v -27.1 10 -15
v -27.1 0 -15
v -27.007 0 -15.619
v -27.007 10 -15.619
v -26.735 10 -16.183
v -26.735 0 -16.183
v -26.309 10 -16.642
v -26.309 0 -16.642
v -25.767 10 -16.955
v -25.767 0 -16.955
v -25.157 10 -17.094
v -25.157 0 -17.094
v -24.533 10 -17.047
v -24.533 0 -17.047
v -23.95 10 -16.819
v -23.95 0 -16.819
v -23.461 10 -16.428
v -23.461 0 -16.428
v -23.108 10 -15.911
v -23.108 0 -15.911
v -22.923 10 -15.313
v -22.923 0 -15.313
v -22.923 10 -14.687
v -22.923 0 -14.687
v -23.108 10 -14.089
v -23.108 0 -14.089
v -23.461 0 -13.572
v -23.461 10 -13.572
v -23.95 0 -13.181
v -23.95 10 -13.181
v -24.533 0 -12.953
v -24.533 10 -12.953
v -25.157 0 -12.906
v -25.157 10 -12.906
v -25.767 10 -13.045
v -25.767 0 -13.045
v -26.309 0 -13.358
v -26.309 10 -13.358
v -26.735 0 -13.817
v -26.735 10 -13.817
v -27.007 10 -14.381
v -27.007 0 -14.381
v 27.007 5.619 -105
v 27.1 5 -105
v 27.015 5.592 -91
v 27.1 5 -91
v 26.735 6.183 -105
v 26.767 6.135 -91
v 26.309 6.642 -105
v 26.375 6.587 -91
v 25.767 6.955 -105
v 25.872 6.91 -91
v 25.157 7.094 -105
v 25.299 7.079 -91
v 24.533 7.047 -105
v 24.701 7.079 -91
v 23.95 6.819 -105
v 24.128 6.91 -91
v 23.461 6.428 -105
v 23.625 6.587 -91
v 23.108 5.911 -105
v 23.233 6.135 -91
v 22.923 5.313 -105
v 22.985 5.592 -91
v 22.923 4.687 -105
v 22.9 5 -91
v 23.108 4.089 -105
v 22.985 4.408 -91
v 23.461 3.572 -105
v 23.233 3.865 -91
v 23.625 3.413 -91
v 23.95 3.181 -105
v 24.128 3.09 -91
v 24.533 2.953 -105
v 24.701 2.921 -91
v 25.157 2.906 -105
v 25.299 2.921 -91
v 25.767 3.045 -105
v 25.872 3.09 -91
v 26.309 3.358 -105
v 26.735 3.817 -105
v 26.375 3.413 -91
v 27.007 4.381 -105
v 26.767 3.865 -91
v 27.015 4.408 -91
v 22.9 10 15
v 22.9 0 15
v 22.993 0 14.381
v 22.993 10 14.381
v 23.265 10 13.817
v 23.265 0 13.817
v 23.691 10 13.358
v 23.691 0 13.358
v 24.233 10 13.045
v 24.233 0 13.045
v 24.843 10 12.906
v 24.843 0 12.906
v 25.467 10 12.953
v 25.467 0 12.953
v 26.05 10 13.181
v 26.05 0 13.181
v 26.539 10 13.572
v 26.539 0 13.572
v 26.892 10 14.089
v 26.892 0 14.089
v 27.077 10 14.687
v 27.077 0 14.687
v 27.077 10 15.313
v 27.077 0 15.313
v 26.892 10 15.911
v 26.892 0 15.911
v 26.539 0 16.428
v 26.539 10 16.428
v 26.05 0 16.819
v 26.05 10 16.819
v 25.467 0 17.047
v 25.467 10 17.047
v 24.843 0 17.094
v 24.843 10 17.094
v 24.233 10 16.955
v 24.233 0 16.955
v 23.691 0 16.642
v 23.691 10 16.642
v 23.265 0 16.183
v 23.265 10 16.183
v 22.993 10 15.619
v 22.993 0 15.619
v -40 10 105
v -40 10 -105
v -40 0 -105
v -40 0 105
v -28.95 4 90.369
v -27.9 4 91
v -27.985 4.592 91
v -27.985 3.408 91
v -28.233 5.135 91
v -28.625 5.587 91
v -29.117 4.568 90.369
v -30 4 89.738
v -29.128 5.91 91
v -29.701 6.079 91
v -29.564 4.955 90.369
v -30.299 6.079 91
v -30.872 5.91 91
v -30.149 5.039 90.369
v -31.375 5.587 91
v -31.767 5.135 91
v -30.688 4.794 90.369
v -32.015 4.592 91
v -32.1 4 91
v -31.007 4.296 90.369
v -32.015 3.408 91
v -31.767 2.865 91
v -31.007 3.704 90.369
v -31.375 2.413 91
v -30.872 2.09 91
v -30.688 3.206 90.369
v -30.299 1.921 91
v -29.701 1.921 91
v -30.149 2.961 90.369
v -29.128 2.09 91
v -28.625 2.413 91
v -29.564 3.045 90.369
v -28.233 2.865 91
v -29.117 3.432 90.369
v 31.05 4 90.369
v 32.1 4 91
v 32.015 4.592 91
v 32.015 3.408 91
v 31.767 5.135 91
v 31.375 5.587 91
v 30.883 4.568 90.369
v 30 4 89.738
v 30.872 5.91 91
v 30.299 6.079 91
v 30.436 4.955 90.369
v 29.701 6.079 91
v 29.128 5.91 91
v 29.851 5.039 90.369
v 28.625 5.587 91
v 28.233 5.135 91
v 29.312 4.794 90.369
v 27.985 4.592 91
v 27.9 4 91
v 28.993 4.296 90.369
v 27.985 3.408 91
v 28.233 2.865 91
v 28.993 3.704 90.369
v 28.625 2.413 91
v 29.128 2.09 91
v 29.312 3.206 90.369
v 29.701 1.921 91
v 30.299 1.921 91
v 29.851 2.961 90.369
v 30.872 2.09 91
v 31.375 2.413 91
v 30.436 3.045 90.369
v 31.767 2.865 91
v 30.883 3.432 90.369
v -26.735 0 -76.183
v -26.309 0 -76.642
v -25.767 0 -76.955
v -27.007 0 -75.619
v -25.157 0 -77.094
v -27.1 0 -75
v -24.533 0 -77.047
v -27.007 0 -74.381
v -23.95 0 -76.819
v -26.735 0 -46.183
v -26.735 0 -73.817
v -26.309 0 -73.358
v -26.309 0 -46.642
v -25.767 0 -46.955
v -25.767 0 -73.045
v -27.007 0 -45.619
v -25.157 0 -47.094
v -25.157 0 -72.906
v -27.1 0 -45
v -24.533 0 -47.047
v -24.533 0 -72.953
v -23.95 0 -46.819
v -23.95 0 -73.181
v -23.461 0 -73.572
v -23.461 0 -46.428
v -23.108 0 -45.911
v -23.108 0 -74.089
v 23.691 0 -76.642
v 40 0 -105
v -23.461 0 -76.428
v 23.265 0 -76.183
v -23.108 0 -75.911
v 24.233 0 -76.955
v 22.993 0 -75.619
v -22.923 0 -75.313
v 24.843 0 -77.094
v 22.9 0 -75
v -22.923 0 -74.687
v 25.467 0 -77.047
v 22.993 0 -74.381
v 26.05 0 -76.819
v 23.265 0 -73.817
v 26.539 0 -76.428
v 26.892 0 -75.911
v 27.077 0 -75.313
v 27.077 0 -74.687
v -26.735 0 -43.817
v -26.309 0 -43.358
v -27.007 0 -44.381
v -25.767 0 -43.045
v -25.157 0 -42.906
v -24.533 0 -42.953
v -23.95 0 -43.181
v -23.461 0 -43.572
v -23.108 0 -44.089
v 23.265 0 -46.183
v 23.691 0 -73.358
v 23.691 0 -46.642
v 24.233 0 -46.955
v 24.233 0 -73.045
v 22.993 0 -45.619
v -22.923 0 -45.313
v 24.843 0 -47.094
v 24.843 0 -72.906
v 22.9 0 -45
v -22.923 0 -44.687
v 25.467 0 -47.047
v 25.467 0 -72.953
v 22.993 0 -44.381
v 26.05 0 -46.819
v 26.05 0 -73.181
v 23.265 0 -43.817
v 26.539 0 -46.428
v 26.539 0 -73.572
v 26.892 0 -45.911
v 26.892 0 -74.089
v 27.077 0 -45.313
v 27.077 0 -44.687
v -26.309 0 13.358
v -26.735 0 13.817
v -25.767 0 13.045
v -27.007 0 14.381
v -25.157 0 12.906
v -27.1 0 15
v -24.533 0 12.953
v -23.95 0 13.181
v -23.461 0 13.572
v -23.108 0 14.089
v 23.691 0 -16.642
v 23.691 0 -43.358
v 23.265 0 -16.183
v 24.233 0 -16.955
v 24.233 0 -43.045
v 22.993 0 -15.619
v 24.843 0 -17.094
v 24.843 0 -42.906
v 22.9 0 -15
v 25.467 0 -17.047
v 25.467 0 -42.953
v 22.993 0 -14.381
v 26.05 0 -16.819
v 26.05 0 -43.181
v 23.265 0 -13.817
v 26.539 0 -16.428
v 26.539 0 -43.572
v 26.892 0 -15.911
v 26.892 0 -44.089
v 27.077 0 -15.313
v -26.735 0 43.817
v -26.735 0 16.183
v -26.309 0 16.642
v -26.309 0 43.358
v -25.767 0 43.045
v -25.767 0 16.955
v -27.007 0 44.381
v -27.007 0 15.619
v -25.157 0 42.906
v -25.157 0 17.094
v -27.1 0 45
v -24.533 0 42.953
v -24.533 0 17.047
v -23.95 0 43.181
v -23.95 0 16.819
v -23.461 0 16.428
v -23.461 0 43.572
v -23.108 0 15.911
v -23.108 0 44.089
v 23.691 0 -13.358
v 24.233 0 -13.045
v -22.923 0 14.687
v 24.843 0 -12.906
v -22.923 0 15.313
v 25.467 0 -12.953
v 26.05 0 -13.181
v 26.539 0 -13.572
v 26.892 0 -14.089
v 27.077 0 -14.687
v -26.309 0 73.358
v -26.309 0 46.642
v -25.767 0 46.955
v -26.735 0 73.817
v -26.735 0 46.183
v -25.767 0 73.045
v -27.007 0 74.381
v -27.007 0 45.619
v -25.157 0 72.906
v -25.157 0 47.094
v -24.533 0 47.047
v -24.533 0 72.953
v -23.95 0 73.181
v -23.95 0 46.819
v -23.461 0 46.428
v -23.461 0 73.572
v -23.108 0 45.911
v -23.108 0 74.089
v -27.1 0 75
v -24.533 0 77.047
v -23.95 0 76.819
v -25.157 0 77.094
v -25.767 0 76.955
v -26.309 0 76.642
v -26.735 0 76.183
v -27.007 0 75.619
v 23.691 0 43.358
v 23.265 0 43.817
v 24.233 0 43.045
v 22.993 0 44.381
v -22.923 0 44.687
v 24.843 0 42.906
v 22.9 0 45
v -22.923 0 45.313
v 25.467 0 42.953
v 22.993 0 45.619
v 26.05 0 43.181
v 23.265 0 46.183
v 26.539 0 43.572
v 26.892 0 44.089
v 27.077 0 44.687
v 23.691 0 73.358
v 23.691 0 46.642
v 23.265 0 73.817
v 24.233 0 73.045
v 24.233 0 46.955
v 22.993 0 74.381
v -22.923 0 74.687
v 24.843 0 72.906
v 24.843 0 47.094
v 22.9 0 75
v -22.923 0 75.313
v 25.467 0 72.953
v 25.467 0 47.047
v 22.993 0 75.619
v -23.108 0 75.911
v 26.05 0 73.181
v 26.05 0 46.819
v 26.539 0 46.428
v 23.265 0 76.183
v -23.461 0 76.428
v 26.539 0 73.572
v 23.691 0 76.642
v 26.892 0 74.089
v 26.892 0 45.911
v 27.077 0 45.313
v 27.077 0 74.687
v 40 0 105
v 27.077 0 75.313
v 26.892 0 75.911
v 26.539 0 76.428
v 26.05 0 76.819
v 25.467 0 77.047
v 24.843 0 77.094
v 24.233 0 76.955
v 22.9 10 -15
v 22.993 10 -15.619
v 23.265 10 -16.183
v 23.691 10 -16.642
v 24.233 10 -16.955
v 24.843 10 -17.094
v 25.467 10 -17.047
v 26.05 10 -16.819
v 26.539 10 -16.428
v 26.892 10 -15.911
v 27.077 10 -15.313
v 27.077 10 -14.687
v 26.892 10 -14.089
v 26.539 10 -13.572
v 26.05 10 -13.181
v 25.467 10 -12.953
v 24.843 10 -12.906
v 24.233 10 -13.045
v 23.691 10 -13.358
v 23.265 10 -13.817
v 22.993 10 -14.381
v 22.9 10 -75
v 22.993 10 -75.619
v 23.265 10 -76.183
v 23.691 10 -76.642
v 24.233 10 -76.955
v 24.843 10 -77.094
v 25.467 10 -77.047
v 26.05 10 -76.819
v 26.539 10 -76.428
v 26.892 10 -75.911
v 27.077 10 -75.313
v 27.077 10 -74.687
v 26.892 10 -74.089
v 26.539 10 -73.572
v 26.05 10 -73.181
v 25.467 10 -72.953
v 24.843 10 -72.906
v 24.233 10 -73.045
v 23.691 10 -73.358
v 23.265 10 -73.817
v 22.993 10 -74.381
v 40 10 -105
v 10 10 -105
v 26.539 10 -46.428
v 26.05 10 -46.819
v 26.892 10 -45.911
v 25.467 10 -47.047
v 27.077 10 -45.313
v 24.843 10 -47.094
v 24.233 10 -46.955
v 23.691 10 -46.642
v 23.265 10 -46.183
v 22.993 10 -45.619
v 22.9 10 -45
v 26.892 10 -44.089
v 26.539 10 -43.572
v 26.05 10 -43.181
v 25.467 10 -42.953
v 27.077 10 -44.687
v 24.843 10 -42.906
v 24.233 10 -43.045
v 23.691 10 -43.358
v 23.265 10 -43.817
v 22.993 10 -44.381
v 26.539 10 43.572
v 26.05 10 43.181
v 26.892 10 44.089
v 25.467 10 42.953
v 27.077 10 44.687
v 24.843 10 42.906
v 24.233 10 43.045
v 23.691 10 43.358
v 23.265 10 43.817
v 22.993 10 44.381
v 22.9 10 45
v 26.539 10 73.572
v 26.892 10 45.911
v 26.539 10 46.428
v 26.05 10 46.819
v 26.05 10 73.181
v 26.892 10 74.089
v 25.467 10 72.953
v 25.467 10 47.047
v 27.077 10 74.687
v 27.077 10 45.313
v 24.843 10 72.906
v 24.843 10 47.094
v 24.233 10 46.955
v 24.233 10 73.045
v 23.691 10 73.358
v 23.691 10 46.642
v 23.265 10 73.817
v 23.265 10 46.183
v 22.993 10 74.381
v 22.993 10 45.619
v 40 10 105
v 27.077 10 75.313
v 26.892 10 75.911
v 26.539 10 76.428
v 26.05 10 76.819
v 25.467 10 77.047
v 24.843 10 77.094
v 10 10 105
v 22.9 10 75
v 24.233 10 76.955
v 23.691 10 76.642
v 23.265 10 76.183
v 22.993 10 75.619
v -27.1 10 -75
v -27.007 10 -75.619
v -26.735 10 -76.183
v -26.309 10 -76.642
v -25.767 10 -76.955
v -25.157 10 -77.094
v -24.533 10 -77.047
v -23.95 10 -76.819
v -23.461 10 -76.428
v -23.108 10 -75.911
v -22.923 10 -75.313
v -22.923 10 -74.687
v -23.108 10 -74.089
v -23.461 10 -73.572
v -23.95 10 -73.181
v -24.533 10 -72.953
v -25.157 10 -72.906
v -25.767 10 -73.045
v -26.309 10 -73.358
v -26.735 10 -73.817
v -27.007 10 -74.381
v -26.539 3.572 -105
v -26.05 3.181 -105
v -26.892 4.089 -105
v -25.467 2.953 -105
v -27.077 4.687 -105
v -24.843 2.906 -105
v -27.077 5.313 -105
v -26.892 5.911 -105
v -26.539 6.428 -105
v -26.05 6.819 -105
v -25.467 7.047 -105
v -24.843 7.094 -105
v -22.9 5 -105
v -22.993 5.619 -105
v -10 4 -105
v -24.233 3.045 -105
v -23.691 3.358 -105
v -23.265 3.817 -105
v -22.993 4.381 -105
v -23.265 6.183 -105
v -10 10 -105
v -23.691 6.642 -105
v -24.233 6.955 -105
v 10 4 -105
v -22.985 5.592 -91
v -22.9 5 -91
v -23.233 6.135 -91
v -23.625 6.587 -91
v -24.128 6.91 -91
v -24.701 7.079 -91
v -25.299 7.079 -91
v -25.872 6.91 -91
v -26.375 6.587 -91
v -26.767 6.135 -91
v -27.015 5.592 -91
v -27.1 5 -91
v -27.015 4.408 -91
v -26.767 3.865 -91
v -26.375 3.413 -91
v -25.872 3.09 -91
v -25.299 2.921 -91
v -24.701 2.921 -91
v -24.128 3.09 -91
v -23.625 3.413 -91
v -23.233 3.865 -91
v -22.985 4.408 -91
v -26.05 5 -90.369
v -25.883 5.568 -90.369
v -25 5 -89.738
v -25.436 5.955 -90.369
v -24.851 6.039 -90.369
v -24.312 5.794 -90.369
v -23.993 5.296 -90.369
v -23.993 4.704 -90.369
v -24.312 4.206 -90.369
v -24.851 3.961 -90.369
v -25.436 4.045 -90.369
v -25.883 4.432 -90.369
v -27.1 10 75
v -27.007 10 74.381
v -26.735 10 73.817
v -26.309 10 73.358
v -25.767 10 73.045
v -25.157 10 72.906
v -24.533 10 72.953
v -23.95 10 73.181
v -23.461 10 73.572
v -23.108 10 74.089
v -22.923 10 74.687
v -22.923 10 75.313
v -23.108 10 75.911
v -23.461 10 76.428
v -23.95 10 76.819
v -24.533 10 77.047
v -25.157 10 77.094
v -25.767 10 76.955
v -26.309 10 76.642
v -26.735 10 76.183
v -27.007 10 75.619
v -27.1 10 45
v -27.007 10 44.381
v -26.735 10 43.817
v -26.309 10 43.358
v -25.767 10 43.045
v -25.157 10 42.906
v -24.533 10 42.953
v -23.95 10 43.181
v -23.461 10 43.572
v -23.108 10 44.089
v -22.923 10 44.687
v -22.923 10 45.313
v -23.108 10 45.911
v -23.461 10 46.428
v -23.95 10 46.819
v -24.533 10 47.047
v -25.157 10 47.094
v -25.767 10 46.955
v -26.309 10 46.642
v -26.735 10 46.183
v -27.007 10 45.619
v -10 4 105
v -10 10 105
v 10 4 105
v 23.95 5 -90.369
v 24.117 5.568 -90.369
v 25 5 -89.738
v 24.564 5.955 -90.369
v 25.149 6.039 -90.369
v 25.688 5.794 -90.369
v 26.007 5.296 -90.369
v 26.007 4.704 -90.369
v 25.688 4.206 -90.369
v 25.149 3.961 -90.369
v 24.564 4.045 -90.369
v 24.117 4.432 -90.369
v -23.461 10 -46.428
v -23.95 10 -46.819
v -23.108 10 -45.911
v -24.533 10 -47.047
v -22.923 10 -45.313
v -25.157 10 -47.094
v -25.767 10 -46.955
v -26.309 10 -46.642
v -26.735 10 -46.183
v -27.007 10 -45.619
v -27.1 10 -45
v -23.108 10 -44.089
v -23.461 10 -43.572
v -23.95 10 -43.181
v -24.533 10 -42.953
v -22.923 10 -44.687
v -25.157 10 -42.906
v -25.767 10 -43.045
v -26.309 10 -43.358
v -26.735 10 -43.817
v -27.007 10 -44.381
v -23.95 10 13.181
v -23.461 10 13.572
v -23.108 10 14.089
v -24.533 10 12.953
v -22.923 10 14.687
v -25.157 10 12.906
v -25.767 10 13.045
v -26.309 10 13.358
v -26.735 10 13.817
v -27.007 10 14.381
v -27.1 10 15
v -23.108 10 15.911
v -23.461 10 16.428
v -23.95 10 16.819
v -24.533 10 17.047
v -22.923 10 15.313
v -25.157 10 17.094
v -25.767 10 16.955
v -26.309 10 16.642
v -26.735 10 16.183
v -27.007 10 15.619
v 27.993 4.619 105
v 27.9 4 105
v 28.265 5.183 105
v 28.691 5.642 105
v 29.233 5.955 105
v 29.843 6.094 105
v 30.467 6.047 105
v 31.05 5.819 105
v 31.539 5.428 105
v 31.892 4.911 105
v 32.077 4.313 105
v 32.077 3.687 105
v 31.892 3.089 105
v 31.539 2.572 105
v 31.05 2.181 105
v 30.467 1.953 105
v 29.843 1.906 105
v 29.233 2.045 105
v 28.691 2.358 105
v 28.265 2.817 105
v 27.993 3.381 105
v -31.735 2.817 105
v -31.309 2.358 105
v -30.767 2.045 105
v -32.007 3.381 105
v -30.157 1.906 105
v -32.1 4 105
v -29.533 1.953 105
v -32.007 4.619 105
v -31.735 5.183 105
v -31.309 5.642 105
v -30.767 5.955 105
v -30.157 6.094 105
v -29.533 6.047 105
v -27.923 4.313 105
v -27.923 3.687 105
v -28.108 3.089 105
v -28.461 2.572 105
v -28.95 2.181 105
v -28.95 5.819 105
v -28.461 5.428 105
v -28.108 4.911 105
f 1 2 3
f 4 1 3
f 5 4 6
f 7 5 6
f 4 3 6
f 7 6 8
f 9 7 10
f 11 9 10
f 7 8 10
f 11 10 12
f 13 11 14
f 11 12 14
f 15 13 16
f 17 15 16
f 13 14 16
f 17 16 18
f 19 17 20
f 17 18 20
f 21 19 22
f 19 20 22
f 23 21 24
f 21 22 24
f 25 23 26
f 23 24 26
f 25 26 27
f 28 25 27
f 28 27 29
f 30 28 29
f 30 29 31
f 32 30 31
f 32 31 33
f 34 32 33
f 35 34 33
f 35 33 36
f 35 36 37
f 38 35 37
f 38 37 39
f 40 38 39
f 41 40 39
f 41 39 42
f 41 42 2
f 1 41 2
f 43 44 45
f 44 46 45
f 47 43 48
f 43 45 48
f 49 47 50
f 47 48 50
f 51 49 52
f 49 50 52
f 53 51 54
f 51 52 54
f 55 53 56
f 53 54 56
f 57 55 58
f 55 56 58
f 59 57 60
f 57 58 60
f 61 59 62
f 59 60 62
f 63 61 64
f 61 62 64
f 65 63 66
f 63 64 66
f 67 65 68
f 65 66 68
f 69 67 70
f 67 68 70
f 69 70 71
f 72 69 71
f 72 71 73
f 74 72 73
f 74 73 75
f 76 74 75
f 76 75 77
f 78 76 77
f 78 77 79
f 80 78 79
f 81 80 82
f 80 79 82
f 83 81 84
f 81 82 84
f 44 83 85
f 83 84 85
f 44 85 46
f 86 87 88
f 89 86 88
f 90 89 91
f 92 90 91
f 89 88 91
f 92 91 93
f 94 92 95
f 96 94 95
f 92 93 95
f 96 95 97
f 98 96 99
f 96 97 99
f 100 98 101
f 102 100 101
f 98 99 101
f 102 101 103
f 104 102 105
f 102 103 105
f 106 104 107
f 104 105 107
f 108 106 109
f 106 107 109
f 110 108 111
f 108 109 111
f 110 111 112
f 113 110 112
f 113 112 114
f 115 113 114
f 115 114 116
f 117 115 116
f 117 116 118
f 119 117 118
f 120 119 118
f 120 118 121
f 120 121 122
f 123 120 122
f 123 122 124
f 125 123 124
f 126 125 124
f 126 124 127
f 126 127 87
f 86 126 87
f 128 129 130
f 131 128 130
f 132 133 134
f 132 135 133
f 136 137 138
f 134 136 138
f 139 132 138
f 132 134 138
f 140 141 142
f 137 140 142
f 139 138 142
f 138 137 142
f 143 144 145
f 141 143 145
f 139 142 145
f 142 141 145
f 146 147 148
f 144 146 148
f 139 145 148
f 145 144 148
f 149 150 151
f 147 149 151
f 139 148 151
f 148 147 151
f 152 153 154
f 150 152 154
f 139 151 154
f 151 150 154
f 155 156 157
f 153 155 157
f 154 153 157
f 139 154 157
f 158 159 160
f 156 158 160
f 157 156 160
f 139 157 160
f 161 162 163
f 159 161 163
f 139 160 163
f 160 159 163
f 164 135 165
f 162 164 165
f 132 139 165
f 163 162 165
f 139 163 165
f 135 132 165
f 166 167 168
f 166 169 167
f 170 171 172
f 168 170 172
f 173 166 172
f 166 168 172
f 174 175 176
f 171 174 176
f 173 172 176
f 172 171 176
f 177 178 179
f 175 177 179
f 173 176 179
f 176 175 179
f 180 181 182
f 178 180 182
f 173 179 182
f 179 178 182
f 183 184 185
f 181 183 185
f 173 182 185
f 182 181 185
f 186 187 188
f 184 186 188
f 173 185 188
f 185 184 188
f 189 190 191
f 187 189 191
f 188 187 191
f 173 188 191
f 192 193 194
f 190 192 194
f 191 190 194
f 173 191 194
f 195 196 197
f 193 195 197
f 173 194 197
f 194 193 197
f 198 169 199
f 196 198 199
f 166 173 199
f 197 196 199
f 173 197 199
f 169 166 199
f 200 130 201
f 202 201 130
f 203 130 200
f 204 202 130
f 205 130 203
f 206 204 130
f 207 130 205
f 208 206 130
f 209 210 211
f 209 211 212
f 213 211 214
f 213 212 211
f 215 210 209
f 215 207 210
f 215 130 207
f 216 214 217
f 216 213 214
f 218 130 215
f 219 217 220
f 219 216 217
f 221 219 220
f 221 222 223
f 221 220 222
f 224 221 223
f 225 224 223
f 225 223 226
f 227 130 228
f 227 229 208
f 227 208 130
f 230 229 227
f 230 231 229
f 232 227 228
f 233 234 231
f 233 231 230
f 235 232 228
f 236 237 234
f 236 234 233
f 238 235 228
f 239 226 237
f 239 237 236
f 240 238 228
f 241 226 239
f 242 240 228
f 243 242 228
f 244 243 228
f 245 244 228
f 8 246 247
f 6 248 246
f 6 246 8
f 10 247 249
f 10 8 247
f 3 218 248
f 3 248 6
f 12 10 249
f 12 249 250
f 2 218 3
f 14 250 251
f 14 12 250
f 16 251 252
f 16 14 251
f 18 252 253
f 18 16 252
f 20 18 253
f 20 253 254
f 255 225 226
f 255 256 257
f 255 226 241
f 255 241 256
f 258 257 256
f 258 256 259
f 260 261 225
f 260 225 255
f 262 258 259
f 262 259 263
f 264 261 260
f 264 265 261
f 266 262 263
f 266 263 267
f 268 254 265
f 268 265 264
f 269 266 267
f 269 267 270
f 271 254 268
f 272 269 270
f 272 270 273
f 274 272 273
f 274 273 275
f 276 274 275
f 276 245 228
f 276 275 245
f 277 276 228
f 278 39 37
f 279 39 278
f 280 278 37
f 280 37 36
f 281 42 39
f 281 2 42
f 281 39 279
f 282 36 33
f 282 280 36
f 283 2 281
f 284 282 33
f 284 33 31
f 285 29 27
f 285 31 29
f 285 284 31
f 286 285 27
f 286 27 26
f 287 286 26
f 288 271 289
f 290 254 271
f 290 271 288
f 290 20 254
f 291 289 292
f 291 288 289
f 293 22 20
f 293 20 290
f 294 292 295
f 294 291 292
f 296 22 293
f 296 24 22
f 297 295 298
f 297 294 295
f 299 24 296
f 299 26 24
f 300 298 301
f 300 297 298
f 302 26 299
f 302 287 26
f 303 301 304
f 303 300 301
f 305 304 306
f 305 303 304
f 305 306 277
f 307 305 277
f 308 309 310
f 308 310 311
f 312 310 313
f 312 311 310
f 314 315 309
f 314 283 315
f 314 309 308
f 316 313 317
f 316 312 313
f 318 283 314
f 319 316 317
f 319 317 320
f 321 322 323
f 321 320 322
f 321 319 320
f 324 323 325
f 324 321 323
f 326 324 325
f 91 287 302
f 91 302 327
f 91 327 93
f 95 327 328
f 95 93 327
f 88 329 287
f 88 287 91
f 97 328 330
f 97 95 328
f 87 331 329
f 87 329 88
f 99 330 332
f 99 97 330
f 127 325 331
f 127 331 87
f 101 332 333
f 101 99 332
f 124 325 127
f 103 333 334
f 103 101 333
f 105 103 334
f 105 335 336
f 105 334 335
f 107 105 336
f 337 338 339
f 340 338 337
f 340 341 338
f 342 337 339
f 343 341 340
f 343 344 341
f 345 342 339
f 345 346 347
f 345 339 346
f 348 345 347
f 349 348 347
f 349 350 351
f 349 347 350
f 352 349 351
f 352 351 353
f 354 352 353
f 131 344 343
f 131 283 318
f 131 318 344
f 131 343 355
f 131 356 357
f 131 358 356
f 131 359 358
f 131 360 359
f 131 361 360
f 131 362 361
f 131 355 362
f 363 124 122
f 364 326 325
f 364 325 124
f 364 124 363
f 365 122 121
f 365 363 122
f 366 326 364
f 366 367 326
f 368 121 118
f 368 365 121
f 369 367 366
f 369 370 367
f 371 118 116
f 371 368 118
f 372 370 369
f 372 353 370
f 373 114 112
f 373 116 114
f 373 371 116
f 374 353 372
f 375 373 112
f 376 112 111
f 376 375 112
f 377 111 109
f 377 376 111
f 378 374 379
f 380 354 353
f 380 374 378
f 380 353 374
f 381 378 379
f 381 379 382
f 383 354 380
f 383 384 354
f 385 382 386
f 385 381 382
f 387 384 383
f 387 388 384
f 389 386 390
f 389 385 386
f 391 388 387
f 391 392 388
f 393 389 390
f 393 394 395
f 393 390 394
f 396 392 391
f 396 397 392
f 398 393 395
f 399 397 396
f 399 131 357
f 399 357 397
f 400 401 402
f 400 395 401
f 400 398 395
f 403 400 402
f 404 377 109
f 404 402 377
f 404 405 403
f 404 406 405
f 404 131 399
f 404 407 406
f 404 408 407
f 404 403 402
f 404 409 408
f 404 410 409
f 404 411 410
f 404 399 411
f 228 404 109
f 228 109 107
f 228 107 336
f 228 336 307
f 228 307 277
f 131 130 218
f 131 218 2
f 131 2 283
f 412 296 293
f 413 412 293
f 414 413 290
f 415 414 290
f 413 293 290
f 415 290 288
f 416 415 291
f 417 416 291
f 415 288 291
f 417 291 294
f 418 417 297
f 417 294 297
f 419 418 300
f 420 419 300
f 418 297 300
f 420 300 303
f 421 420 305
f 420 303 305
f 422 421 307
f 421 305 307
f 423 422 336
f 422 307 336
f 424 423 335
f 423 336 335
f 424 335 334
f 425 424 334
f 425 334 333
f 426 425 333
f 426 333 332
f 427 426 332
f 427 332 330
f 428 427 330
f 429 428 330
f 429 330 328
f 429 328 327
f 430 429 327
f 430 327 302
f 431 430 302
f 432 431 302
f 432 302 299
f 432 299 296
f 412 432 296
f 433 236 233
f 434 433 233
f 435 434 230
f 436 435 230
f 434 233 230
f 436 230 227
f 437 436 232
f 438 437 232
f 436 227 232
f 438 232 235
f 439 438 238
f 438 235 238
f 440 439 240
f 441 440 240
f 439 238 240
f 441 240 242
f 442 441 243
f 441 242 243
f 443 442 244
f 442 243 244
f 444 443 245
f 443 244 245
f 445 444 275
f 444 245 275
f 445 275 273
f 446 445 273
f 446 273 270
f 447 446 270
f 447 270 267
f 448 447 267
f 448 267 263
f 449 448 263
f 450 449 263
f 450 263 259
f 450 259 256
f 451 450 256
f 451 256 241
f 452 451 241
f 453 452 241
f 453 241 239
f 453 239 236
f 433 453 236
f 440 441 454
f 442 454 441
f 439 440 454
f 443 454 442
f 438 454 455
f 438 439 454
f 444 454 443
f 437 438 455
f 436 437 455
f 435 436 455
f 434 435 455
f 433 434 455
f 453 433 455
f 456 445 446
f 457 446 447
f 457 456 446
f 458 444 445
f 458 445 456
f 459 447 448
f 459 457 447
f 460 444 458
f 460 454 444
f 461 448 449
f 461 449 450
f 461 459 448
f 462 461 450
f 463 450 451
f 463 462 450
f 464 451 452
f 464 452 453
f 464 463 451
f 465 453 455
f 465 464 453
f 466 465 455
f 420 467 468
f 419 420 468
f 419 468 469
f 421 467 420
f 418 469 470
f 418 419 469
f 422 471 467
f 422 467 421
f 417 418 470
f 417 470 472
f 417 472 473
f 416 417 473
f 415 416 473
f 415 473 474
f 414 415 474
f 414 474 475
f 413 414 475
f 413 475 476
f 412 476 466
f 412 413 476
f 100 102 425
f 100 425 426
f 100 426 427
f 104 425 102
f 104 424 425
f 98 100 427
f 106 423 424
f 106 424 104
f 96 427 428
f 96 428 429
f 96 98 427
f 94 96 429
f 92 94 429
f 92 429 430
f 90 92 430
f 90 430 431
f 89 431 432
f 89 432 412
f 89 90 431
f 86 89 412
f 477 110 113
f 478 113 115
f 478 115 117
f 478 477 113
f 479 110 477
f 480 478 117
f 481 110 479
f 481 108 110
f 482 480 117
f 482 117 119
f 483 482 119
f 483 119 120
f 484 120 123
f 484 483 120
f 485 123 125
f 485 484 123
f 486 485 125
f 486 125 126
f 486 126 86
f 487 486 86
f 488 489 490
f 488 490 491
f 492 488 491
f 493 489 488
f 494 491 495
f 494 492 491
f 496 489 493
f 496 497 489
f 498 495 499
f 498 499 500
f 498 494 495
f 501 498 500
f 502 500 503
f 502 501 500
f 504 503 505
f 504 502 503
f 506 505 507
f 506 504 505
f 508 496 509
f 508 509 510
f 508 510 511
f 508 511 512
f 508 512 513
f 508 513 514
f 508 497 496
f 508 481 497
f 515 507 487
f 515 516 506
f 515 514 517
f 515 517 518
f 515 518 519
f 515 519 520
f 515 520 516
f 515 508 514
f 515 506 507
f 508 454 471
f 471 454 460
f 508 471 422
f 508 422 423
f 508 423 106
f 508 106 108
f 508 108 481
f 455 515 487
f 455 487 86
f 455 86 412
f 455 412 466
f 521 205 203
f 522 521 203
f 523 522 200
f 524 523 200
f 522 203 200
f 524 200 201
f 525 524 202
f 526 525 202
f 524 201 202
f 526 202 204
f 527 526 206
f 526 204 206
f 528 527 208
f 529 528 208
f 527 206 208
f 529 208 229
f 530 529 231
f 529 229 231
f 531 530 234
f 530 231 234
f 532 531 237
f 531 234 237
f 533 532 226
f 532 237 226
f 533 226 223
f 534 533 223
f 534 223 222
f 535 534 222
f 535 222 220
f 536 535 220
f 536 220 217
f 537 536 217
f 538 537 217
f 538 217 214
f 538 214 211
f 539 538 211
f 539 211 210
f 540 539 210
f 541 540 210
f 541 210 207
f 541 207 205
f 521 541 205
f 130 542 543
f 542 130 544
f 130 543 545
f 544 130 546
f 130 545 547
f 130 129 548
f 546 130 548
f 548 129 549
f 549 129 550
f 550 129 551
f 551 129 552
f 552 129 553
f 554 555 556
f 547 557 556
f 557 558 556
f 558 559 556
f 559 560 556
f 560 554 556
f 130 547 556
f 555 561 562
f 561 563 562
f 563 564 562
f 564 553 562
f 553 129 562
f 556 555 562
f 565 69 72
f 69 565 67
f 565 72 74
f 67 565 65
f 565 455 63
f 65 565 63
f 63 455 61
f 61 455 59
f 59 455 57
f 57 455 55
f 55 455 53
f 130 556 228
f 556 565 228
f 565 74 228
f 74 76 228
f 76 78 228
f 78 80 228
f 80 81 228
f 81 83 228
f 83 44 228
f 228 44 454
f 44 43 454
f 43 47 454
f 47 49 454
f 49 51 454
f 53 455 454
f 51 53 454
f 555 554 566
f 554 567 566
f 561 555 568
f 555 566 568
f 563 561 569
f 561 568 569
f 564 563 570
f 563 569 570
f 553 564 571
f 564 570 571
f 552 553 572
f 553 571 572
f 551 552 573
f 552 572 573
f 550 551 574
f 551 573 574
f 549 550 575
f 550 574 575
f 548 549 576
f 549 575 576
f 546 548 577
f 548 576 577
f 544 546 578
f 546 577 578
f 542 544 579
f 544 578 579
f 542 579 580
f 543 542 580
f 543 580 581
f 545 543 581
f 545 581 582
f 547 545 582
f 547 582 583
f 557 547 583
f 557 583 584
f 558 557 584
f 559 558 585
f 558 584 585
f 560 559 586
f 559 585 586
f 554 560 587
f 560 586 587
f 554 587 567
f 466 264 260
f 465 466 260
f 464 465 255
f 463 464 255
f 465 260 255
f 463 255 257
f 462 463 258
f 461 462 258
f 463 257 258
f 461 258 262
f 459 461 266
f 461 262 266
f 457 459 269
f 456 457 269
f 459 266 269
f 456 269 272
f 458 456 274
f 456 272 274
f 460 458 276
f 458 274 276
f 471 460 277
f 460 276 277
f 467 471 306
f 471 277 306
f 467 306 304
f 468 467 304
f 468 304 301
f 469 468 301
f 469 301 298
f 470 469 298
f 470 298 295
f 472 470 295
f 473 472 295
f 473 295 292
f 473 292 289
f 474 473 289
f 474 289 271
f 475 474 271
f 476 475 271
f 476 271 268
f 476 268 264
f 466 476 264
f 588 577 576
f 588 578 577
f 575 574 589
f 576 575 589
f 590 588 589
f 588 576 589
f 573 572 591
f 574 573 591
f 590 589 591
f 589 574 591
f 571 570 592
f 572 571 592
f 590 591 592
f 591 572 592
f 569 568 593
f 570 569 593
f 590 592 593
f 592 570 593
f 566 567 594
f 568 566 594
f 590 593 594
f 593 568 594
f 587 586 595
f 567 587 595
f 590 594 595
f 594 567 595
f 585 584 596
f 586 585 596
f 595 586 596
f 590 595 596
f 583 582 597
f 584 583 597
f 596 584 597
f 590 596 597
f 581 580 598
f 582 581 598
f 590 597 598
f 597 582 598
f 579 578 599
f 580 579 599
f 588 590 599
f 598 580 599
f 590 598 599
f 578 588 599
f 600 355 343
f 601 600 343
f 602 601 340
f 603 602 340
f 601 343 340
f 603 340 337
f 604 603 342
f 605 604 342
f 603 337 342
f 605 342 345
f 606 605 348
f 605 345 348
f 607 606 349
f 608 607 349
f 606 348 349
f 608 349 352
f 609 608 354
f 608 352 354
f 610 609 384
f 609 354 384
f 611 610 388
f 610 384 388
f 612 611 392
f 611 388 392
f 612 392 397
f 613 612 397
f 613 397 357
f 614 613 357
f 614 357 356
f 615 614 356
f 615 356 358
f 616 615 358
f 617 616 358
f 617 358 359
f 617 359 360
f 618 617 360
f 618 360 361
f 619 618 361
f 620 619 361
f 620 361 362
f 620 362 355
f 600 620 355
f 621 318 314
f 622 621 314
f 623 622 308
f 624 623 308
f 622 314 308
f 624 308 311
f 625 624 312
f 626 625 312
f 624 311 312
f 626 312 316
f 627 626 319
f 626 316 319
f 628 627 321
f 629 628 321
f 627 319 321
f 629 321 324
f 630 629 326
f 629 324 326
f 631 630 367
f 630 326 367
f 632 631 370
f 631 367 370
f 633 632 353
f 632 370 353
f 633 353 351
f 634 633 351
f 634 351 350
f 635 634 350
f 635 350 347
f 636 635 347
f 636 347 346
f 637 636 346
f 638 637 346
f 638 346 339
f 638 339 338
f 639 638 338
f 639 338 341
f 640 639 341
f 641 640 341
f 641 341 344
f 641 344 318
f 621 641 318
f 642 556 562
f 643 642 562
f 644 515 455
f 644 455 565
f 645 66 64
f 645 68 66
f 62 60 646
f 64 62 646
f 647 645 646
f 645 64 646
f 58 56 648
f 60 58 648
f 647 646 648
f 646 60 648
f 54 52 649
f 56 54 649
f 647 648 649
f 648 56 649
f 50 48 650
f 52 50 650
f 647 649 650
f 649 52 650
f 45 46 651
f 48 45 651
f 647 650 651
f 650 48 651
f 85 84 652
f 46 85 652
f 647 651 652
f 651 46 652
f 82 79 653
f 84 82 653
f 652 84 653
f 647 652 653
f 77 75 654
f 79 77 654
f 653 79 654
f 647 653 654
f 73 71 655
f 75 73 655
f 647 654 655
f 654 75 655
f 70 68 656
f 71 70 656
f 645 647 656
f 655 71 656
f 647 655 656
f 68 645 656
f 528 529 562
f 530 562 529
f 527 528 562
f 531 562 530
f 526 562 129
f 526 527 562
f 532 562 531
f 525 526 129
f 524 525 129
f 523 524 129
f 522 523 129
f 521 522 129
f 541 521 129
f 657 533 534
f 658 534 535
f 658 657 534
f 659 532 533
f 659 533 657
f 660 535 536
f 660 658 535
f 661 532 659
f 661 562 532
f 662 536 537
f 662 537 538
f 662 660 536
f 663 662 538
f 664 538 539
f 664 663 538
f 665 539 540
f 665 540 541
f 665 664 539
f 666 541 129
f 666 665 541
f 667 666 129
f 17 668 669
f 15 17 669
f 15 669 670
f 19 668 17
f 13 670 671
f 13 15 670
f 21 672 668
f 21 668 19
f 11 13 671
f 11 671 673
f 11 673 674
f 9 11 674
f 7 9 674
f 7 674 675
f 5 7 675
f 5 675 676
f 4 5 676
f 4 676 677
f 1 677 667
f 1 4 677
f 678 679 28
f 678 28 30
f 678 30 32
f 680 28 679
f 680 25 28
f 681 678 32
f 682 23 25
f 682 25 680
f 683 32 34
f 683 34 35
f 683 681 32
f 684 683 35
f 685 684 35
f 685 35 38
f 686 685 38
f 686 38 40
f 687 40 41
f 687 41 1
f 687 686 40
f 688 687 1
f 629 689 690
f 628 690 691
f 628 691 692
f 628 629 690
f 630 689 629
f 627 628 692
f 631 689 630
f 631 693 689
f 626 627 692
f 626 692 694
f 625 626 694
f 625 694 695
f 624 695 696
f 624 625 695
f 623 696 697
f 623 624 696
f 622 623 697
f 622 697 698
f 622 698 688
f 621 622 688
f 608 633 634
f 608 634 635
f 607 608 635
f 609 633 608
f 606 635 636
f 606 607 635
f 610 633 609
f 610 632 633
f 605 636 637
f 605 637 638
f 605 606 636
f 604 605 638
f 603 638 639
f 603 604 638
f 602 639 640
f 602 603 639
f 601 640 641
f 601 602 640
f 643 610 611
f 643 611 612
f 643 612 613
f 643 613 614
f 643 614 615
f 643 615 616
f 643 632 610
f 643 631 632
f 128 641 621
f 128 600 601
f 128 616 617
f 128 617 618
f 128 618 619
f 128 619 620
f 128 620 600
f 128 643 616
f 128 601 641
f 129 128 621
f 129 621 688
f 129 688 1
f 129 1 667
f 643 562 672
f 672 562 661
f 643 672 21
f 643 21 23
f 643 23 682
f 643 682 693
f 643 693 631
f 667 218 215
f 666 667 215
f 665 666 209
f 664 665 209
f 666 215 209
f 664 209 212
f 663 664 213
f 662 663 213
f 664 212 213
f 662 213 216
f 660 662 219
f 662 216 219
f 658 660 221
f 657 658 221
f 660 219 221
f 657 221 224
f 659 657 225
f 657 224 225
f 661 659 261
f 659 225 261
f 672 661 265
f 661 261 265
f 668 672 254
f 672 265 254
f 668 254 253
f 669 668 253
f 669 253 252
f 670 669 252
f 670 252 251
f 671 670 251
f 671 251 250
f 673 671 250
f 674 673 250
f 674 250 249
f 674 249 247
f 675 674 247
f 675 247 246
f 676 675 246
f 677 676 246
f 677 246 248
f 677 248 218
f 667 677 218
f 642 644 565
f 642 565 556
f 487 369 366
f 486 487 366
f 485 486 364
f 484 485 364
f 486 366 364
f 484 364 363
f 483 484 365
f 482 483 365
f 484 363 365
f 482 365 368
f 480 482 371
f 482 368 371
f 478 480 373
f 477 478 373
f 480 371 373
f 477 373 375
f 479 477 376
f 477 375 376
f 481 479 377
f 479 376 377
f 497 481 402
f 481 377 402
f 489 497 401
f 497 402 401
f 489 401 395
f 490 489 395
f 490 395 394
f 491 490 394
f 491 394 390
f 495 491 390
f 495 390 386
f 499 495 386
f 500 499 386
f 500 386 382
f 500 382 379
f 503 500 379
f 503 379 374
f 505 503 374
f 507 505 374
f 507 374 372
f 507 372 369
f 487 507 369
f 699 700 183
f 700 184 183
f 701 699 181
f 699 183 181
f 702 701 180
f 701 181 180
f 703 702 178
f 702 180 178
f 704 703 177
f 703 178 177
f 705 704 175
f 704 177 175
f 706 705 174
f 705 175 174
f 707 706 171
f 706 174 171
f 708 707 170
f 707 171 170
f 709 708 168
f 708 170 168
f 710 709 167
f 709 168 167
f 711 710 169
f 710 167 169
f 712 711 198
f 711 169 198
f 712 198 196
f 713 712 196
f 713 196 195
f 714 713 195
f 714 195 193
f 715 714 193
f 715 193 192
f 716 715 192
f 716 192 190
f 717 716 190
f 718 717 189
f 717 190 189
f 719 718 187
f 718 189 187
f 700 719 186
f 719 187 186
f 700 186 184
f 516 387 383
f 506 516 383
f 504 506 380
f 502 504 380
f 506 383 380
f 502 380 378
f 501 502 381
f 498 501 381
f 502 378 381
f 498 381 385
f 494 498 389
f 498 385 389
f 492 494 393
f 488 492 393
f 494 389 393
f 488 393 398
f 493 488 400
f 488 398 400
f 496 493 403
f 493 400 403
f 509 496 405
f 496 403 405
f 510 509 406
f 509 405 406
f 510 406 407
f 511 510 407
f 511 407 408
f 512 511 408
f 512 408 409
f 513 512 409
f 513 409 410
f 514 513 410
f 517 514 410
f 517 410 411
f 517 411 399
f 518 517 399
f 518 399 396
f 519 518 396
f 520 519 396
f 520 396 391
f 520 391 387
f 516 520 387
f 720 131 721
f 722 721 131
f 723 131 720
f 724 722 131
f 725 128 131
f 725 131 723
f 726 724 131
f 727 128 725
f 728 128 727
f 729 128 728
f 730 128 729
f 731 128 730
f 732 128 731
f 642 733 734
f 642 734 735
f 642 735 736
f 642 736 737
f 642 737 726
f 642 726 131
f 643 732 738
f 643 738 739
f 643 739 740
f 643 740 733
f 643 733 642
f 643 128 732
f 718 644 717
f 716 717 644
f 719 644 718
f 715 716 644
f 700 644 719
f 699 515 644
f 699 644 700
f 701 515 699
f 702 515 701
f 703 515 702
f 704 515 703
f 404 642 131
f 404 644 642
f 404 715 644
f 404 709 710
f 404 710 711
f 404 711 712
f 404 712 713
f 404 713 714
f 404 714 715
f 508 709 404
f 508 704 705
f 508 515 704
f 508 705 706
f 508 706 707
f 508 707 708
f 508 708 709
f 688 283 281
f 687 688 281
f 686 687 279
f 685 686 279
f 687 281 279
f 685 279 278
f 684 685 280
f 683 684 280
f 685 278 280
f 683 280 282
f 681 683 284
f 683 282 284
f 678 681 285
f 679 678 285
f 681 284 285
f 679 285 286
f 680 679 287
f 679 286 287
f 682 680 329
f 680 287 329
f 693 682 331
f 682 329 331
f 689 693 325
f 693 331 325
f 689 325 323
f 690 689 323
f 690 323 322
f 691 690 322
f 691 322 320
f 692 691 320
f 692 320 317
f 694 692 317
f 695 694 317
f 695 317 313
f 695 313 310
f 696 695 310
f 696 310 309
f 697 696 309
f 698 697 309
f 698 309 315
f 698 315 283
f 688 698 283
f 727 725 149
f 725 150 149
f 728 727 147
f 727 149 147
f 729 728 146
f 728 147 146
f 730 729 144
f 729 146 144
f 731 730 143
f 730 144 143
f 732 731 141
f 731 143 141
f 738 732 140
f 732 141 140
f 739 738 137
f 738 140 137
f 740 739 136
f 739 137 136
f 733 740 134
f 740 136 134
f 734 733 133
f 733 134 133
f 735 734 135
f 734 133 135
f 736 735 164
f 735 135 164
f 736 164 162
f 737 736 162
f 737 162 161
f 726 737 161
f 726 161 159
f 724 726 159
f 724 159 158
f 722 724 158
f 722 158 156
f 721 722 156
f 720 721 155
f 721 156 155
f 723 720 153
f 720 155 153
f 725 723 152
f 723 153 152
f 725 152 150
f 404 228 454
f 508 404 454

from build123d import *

# Parameters (mm, degrees)
AUFSATZ_LINEAR_AUSTRAGEN1_DEPTH = 105
M5_GEWINDEBOHRUNG1_D            = 4.2
M5_GEWINDEBOHRUNG1_DEPTH        = 14
M5_GEWINDEBOHRUNG1_TIP          = 1.2618073
M5_GEWINDEBOHRUNG2_D            = 4.2
M5_GEWINDEBOHRUNG2_DEPTH        = 14
M5_GEWINDEBOHRUNG2_TIP          = 1.2618073
M5_GEWINDEBOHRUNG3_D            = 4.2


with BuildPart() as part:
    # Skizze1 → Aufsatz-Linear austragen1 (new body, symmetric)
    with BuildSketch(Plane.XY):
        Polygon((-40, 0), (40, 0), (40, 10), (10, 10), (10, 4), (-10, 4), (-10, 10), (-40, 10), align=None)
    extrude(amount=AUFSATZ_LINEAR_AUSTRAGEN1_DEPTH, both=True)

    # M5 Gewindebohrung1
    with Locations(Plane.XY.offset(105)):
        with Locations((-30, 4), (30, 4)):
            Hole(M5_GEWINDEBOHRUNG1_D / 2, depth=M5_GEWINDEBOHRUNG1_DEPTH)
            with Locations((0, 0, -(M5_GEWINDEBOHRUNG1_DEPTH + M5_GEWINDEBOHRUNG1_TIP / 2))):  # 118° drill point
                Cone(0, M5_GEWINDEBOHRUNG1_D / 2, M5_GEWINDEBOHRUNG1_TIP, mode=Mode.SUBTRACT)

    # M5 Gewindebohrung2
    with Locations(Plane(origin=(0, 0, -105), x_dir=(-1, 0, 0), z_dir=(0, 0, -1))):
        with Locations((-25, 5), (25, 5)):
            Hole(M5_GEWINDEBOHRUNG2_D / 2, depth=M5_GEWINDEBOHRUNG2_DEPTH)
            with Locations((0, 0, -(M5_GEWINDEBOHRUNG2_DEPTH + M5_GEWINDEBOHRUNG2_TIP / 2))):  # 118° drill point
                Cone(0, M5_GEWINDEBOHRUNG2_D / 2, M5_GEWINDEBOHRUNG2_TIP, mode=Mode.SUBTRACT)

    # M5 Gewindebohrung3 (through all)
    with Locations(Plane(origin=(0, 10, 0), x_dir=(1, 0, 0), z_dir=(0, 1, 0))):
        with Locations((25, -75), (-25, -75), (-25, -45), (-25, -15), (-25, 15), (-25, 45), (-25, 75), (25, 75), (25, 45), (25, 15), (25, -15), (25, -45)):
            Hole(M5_GEWINDEBOHRUNG3_D / 2)


solid = part.part
